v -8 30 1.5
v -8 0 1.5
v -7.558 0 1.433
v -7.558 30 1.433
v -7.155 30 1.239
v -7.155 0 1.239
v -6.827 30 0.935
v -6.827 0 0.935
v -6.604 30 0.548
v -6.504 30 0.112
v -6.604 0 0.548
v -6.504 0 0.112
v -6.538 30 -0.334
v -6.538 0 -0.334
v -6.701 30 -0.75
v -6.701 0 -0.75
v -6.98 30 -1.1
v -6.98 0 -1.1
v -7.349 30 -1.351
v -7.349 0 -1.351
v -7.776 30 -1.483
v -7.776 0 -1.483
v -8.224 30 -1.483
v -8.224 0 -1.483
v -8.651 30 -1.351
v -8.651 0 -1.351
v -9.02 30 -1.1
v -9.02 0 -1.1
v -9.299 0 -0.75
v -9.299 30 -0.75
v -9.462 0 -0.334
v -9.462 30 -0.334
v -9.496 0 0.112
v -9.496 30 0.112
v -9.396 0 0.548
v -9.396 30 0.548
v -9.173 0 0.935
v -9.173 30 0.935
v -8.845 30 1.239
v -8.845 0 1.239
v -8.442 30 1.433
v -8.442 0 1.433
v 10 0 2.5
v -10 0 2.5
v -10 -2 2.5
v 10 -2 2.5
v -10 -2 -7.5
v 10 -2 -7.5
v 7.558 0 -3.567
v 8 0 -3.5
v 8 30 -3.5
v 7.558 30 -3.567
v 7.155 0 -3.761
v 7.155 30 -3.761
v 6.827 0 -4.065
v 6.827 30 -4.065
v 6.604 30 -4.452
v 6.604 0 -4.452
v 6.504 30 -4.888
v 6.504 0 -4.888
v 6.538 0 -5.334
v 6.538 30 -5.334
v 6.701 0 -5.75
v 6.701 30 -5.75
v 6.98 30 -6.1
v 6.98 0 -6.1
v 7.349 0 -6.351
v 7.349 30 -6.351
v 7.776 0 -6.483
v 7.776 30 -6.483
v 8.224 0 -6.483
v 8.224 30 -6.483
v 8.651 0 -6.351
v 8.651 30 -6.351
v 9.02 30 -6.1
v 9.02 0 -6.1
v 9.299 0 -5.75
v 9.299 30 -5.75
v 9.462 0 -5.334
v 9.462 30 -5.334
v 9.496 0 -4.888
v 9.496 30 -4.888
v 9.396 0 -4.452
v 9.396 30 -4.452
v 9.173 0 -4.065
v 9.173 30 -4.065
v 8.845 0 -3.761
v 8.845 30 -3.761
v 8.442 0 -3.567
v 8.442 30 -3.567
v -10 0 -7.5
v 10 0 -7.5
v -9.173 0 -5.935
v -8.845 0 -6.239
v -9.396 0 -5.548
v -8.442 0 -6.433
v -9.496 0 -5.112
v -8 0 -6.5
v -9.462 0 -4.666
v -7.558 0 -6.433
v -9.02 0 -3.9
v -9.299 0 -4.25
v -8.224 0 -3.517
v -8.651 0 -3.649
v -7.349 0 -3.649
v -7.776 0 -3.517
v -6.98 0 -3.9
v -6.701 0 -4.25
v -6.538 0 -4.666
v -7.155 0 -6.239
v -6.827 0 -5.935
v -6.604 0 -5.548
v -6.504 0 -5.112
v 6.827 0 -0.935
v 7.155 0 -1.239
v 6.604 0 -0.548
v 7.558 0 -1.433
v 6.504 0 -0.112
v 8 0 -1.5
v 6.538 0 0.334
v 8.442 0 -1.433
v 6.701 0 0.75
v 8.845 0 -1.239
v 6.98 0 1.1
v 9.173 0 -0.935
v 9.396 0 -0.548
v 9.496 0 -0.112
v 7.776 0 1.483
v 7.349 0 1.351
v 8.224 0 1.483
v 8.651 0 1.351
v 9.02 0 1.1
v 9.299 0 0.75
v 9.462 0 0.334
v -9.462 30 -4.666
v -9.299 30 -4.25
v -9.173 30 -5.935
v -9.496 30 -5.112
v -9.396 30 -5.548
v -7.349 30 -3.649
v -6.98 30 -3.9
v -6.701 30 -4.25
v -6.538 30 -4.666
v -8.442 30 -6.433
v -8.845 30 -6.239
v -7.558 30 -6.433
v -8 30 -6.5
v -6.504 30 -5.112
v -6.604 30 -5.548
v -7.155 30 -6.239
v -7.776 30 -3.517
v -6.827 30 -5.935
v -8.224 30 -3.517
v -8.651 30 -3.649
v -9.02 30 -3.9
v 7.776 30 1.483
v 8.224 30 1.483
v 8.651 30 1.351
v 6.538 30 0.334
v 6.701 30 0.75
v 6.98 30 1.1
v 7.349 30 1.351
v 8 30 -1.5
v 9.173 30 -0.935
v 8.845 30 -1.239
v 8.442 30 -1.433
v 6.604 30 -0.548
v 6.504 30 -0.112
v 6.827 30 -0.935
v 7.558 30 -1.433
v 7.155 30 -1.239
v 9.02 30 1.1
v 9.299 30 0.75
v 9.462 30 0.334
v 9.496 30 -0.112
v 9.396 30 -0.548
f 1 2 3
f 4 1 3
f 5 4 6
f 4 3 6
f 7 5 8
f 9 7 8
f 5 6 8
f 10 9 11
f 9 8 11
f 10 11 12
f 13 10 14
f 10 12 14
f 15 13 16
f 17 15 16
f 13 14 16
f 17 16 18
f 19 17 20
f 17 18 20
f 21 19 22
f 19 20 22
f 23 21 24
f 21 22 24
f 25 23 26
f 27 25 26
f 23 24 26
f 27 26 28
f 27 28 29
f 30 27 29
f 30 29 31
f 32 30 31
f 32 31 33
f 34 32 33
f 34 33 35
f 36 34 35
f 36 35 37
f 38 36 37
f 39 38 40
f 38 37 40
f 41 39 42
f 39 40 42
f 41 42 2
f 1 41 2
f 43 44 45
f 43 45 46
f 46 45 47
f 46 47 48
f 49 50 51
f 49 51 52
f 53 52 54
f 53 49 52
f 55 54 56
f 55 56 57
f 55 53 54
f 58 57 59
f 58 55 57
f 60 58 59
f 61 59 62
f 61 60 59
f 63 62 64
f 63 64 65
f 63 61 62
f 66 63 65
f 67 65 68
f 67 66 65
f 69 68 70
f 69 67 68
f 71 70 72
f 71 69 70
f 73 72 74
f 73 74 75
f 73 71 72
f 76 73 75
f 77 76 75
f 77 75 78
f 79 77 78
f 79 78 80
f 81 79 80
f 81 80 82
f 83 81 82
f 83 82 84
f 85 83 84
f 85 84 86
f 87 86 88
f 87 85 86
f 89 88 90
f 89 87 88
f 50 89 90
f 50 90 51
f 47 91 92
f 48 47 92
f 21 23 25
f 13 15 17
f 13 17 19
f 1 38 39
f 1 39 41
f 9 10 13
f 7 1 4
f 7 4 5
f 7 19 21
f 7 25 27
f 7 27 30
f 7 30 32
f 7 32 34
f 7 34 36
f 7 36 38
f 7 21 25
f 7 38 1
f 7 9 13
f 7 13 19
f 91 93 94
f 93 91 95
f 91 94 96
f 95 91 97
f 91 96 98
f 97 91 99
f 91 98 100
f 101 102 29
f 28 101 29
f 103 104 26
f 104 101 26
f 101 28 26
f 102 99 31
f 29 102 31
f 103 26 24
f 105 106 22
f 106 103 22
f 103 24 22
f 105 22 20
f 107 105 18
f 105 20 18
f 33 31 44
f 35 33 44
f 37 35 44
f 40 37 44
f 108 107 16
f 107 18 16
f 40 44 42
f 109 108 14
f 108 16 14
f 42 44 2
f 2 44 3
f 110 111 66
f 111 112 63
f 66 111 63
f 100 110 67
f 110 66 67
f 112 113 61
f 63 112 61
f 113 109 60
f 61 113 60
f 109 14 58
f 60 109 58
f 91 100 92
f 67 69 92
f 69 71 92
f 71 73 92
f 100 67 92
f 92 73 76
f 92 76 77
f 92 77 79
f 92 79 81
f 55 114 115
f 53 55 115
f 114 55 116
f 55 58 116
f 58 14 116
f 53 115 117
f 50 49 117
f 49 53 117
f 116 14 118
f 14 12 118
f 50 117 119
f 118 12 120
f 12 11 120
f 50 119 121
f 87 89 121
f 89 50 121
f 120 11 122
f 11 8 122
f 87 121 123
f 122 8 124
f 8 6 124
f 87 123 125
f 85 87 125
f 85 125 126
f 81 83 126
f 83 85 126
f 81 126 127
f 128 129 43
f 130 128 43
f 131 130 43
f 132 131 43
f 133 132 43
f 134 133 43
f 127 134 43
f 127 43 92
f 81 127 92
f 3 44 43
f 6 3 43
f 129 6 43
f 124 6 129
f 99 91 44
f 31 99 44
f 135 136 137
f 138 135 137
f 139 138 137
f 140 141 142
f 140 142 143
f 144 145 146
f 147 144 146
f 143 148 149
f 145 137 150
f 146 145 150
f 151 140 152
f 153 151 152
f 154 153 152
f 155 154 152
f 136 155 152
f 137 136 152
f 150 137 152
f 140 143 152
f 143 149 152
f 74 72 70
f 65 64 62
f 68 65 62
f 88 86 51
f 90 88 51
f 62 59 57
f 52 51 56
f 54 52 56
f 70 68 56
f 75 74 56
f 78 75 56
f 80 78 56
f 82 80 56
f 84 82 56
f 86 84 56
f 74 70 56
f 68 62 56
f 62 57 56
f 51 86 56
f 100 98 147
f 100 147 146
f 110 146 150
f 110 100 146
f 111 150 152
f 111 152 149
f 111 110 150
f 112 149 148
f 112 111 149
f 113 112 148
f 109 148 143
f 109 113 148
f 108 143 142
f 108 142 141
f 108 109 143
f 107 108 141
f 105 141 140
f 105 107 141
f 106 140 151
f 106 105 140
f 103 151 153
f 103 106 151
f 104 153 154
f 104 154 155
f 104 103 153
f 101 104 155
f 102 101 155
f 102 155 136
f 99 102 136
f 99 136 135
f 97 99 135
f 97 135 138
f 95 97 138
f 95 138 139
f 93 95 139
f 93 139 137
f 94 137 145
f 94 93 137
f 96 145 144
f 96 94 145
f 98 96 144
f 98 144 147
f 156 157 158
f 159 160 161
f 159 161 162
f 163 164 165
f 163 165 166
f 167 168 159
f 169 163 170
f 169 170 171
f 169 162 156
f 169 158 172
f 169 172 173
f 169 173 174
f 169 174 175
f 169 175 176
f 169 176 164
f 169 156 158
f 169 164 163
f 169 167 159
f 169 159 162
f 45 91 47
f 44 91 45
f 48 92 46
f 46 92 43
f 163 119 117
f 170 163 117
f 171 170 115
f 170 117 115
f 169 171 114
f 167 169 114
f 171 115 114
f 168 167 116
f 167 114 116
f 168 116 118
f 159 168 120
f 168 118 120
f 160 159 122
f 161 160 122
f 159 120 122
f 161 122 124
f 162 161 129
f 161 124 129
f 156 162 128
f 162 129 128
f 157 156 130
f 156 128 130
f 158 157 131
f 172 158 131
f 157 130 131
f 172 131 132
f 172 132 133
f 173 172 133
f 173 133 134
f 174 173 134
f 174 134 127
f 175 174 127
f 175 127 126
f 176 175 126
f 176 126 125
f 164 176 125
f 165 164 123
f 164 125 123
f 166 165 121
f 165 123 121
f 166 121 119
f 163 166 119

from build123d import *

# Parameters (mm, degrees)
SKETCH_1_W      = 20
SKETCH_1_H      = 5
EXTRUDE_2_DEPTH = 2
SKETCH_4_R      = 1.5
EXTRUDE_3_DEPTH = 30


with BuildPart() as part:
    # 草图1 → 凸台-拉伸2 (new body)
    with BuildSketch(Plane(origin=(0, 0, 0), x_dir=(1, 0, 0), z_dir=(0, 1, 0))):
        Rectangle(SKETCH_1_W, SKETCH_1_H)
    extrude_2 = extrude(amount=-EXTRUDE_2_DEPTH)

    # 草图4 → 凸台-拉伸3 (add)
    with BuildSketch(Plane(origin=(0, 0, 0), x_dir=(1, 0, 0), z_dir=(0, 1, 0))):
        with Locations(Location((-8, 0, 0), (0, 0, 270))):
            Circle(SKETCH_4_R)
        with Locations(Location((8, 0, 0), (0, 0, 90))):
            Circle(SKETCH_4_R)
    extrude_3 = extrude(amount=EXTRUDE_3_DEPTH)

    # 镜向1: 凸台-拉伸2, 凸台-拉伸3 across plane
    add(extrude_2.mirror(Plane(origin=(0, 0, -2.5), x_dir=(1, 0, 0), z_dir=(0, 0, -1))))
    add(extrude_3.mirror(Plane(origin=(0, 0, -2.5), x_dir=(1, 0, 0), z_dir=(0, 0, -1))))


solid = part.part
